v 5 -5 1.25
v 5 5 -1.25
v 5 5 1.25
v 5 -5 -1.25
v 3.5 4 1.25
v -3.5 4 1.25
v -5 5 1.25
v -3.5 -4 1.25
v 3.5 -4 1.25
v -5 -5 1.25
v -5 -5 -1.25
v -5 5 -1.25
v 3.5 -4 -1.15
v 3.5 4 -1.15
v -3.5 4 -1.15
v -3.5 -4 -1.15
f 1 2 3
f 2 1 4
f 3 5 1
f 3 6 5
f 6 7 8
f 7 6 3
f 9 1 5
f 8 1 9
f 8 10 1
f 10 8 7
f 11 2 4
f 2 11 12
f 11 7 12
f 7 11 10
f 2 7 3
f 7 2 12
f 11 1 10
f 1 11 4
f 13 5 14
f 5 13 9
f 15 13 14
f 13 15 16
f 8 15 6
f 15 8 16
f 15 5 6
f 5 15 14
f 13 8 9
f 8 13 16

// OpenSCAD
difference() {
    cube([10,10,2.5], center=true);
    translate([0,0,0.1]) cube([7,8,2.5], center=true);
}
